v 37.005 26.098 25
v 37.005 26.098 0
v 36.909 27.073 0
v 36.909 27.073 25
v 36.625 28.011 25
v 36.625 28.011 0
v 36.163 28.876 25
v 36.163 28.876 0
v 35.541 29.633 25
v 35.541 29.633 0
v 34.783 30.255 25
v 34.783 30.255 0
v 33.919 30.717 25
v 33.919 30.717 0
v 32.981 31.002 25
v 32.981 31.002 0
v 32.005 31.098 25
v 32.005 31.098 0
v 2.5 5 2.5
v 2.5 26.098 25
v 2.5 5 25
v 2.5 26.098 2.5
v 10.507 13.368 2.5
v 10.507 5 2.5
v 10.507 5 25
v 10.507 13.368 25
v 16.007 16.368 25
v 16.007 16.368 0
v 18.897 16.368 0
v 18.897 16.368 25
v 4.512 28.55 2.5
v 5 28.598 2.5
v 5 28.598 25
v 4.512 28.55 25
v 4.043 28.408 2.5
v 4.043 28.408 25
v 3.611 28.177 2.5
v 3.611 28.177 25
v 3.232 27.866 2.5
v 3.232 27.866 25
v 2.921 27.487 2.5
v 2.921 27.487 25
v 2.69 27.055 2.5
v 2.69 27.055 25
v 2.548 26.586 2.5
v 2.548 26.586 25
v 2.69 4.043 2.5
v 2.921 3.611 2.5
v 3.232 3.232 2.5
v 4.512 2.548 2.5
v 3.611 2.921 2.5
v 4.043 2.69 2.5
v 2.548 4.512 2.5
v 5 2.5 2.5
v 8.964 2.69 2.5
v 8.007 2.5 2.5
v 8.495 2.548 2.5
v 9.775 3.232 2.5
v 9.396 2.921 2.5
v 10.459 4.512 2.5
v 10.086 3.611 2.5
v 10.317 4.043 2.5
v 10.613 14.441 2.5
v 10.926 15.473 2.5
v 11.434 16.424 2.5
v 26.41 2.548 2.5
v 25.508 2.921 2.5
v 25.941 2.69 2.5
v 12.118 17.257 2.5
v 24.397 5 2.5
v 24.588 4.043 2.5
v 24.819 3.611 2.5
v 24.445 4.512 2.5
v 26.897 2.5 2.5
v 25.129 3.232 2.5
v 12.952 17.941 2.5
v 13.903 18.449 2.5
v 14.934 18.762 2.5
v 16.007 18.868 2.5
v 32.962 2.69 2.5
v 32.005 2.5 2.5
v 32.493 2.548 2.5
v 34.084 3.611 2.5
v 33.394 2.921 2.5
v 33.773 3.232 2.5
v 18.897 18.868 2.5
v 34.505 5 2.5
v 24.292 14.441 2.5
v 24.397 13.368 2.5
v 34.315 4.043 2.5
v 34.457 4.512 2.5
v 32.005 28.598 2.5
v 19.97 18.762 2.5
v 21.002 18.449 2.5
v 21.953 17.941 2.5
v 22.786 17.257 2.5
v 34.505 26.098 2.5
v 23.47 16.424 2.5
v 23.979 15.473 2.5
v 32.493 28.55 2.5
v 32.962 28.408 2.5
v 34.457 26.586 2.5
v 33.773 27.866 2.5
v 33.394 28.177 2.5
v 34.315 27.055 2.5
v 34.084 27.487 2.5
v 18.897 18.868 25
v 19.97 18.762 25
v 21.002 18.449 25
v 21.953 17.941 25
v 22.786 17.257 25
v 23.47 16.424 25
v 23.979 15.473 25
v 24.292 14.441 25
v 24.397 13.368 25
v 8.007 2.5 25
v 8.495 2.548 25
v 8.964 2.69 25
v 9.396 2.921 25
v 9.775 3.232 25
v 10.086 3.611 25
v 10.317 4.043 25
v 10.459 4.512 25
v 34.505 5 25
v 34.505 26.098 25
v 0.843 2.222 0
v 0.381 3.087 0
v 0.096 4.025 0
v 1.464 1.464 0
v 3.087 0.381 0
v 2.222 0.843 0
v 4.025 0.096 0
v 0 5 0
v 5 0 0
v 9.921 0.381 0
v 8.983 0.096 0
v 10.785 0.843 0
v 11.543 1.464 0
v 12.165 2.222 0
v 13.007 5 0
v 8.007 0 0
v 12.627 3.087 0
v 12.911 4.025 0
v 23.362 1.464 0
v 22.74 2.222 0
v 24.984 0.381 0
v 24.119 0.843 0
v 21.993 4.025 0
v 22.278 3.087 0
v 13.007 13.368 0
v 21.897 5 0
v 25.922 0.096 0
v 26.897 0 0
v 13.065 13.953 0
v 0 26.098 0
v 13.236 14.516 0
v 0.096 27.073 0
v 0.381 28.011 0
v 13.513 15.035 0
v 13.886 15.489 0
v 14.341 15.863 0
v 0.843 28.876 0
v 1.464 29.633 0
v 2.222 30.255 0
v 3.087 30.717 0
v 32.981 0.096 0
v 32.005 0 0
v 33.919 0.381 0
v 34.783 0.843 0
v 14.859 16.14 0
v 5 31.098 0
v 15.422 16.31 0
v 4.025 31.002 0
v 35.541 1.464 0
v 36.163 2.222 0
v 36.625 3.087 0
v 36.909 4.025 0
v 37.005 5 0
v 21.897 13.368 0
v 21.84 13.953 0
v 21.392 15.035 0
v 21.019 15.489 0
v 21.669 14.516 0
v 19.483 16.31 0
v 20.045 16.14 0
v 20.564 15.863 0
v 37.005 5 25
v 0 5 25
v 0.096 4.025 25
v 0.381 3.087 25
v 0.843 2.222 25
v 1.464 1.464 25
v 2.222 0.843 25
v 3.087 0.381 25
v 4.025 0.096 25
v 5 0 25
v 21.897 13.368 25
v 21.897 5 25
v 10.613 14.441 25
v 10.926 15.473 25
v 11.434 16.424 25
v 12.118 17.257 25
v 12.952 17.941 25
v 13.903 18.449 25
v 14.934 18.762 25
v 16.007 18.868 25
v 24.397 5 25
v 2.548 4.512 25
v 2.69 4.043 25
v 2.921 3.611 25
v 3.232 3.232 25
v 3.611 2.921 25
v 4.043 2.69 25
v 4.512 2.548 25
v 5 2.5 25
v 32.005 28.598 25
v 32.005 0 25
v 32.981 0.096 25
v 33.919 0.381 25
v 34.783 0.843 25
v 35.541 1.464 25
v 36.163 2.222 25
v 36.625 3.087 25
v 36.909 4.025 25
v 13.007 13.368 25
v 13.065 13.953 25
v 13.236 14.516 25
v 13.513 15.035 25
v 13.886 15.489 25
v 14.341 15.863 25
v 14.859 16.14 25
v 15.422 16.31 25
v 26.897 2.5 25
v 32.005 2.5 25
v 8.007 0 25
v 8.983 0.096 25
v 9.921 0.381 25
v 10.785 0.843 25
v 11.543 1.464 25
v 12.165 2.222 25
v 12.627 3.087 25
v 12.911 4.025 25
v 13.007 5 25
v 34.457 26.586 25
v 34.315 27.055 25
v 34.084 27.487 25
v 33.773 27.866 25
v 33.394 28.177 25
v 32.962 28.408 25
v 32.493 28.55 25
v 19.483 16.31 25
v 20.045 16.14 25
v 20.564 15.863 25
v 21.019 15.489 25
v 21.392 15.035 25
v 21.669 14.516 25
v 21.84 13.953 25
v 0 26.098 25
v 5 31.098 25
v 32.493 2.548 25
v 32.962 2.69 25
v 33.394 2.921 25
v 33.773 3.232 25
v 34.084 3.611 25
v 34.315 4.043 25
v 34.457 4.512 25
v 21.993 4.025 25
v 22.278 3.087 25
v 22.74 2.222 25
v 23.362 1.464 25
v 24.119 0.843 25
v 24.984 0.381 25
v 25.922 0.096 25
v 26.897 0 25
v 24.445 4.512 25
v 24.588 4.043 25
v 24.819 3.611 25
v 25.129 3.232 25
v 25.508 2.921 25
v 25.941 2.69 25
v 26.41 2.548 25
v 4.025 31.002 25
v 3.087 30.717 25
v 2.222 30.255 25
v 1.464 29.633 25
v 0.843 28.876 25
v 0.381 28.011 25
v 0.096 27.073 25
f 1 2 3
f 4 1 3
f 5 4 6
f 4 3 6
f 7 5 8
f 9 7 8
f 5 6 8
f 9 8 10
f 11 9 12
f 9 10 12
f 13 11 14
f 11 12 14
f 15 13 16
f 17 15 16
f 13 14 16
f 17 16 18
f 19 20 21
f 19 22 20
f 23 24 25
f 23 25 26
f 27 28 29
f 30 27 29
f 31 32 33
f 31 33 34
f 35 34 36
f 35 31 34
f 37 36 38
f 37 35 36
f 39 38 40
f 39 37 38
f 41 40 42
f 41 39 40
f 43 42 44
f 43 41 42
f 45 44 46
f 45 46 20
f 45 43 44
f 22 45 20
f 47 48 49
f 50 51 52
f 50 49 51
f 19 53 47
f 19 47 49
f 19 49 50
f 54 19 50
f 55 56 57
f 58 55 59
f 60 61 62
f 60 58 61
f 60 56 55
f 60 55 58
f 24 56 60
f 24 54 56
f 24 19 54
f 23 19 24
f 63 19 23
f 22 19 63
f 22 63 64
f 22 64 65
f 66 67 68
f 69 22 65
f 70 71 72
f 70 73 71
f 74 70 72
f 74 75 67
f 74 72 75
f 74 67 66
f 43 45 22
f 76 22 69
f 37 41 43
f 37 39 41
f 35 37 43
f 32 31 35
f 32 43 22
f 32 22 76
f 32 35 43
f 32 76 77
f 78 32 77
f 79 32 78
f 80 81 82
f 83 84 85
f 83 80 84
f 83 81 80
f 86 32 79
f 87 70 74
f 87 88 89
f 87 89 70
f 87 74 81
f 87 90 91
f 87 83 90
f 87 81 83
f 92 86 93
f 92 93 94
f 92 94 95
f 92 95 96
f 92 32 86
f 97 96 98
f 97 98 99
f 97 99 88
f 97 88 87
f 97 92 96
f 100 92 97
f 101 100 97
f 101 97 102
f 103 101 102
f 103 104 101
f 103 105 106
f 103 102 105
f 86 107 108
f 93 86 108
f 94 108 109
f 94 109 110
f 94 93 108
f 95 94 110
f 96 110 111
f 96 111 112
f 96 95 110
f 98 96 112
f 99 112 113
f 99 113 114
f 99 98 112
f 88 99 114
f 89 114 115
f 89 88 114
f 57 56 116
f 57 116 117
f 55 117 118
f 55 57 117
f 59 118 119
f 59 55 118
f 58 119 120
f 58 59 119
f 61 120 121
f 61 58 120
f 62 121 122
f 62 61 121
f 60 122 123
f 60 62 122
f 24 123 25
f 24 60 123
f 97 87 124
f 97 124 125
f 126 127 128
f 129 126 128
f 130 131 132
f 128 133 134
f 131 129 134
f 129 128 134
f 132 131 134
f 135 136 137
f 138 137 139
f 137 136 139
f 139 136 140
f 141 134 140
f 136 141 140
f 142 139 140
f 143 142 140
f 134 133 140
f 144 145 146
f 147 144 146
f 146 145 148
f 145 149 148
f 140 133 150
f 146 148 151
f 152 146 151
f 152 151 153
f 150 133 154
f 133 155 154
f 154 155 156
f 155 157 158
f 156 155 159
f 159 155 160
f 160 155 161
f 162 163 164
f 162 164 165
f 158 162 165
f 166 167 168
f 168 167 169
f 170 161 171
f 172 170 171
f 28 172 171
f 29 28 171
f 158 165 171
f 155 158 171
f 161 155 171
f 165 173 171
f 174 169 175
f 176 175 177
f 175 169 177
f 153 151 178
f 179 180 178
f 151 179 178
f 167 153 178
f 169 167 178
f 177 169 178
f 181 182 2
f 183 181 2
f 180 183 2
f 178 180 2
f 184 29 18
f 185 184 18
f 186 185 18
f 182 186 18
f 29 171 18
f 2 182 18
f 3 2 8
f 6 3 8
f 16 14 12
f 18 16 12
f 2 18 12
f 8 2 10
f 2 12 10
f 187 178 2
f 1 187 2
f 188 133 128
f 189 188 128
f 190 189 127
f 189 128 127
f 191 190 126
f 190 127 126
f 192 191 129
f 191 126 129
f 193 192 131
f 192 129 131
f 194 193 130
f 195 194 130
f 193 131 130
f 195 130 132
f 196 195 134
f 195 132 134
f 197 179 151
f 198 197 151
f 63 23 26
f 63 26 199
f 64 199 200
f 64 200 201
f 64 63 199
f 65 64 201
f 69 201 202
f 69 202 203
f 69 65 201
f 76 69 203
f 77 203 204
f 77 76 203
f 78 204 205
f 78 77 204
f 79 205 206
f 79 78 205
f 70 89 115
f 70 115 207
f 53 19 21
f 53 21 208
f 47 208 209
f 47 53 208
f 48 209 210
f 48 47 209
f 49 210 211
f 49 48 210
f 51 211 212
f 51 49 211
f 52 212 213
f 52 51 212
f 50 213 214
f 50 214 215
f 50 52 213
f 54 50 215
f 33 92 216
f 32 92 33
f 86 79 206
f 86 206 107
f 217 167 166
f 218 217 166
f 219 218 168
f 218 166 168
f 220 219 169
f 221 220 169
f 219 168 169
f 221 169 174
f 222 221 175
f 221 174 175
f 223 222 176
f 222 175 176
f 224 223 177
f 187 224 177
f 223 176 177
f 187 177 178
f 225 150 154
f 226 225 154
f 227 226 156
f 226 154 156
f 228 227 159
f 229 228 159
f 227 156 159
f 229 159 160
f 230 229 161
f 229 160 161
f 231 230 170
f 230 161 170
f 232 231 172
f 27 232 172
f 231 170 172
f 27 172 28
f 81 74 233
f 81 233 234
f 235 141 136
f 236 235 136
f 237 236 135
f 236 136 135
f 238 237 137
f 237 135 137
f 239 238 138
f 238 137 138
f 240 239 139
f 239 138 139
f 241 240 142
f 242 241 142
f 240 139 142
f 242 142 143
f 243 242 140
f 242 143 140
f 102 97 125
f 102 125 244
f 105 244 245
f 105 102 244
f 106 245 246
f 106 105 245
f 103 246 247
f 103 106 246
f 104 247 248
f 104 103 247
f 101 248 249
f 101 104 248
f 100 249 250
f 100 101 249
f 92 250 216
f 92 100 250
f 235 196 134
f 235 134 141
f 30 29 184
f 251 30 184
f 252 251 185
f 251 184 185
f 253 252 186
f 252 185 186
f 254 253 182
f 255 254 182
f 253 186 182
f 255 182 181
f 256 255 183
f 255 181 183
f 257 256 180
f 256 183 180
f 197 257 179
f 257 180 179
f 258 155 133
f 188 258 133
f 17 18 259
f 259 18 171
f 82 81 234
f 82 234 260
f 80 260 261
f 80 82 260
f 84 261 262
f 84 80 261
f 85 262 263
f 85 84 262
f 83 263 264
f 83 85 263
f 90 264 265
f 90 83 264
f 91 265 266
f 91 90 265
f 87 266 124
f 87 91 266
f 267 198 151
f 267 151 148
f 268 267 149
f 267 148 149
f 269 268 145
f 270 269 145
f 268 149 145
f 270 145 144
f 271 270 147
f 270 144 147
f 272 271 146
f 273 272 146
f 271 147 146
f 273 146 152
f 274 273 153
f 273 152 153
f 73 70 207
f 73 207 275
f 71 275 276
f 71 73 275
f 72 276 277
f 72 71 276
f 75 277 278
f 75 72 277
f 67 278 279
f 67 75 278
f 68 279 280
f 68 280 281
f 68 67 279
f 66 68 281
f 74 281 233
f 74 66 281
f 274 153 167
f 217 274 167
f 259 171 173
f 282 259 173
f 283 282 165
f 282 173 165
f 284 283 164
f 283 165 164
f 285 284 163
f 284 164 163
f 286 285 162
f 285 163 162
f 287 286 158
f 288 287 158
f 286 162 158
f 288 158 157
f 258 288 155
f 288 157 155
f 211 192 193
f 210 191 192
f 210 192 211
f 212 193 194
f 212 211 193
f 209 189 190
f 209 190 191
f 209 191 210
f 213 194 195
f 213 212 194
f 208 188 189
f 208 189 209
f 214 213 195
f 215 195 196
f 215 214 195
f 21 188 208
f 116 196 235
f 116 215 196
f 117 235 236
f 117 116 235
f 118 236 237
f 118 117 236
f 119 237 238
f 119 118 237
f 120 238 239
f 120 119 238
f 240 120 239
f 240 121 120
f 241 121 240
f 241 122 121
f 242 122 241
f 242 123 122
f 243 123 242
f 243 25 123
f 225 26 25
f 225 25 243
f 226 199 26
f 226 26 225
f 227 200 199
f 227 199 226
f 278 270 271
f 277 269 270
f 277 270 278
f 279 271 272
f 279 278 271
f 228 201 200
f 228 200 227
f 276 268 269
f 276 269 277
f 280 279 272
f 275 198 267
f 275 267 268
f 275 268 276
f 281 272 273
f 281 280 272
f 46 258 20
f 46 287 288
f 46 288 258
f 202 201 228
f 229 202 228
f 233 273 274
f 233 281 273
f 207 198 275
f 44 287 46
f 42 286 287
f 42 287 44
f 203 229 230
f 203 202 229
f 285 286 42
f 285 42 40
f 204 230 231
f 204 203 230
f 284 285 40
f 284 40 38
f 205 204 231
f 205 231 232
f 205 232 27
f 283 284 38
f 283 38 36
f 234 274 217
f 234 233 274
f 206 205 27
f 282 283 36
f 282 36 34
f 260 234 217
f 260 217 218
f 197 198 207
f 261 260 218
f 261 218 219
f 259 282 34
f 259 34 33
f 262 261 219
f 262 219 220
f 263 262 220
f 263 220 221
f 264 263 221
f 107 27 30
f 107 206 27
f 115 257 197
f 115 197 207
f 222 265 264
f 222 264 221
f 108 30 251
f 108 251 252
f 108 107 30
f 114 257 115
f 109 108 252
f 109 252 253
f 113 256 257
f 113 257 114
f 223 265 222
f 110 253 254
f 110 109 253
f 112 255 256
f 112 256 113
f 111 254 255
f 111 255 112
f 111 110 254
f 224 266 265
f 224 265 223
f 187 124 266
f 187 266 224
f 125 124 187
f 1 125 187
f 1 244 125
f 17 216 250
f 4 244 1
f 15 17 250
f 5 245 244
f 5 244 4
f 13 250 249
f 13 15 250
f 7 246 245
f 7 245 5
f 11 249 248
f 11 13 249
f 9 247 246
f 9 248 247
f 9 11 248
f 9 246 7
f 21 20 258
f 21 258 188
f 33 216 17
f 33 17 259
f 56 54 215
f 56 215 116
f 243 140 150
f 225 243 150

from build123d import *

# Parameters (mm, degrees)
F1_DEPTH = 25
F2_T     = -2.5


with BuildPart() as f1:
    # F0 (on Top) → F1 (new body)
    with BuildSketch(Plane.XY):
        with BuildLine():
            ThreePointArc((0, 5), (1.464466, 1.464466), (5, 0))
            Line((5, 0), (8.007363, 0))
            ThreePointArc((8.007363, 0), (11.542897, 1.464466), (13.007363, 5))
            Line((13.007363, 5), (13.007363, 13.368118))
            ThreePointArc((13.007363, 13.368118), (13.886043, 15.489438), (16.007363, 16.368118))
            Line((16.007363, 16.368118), (18.897251, 16.368118))
            ThreePointArc((18.897251, 16.368118), (21.018571, 15.489438), (21.897251, 13.368118))
            Line((21.897251, 13.368118), (21.897251, 5))
            ThreePointArc((21.897251, 5), (23.361717, 1.464466), (26.897251, 0))
            Line((26.897251, 0), (32.005447, 0))
            ThreePointArc((32.005447, 0), (35.540981, 1.464466), (37.005447, 5))
            Line((37.005447, 5), (37.005447, 26.097955))
            ThreePointArc((37.005447, 26.097955), (35.540981, 29.633489), (32.005447, 31.097955))
            Line((32.005447, 31.097955), (5, 31.097955))
            ThreePointArc((5, 31.097955), (1.464466, 29.633489), (0, 26.097955))
            Line((0, 26.097955), (0, 5))
        make_face()
    extrude(amount=F1_DEPTH)

    # F2
    f2_openings = [f1.faces().sort_by_distance(p)[0] for p in [
        (18.666559, 16.805031, 25),
    ]]
    offset(amount=F2_T, openings=f2_openings)


solid = f1.part
